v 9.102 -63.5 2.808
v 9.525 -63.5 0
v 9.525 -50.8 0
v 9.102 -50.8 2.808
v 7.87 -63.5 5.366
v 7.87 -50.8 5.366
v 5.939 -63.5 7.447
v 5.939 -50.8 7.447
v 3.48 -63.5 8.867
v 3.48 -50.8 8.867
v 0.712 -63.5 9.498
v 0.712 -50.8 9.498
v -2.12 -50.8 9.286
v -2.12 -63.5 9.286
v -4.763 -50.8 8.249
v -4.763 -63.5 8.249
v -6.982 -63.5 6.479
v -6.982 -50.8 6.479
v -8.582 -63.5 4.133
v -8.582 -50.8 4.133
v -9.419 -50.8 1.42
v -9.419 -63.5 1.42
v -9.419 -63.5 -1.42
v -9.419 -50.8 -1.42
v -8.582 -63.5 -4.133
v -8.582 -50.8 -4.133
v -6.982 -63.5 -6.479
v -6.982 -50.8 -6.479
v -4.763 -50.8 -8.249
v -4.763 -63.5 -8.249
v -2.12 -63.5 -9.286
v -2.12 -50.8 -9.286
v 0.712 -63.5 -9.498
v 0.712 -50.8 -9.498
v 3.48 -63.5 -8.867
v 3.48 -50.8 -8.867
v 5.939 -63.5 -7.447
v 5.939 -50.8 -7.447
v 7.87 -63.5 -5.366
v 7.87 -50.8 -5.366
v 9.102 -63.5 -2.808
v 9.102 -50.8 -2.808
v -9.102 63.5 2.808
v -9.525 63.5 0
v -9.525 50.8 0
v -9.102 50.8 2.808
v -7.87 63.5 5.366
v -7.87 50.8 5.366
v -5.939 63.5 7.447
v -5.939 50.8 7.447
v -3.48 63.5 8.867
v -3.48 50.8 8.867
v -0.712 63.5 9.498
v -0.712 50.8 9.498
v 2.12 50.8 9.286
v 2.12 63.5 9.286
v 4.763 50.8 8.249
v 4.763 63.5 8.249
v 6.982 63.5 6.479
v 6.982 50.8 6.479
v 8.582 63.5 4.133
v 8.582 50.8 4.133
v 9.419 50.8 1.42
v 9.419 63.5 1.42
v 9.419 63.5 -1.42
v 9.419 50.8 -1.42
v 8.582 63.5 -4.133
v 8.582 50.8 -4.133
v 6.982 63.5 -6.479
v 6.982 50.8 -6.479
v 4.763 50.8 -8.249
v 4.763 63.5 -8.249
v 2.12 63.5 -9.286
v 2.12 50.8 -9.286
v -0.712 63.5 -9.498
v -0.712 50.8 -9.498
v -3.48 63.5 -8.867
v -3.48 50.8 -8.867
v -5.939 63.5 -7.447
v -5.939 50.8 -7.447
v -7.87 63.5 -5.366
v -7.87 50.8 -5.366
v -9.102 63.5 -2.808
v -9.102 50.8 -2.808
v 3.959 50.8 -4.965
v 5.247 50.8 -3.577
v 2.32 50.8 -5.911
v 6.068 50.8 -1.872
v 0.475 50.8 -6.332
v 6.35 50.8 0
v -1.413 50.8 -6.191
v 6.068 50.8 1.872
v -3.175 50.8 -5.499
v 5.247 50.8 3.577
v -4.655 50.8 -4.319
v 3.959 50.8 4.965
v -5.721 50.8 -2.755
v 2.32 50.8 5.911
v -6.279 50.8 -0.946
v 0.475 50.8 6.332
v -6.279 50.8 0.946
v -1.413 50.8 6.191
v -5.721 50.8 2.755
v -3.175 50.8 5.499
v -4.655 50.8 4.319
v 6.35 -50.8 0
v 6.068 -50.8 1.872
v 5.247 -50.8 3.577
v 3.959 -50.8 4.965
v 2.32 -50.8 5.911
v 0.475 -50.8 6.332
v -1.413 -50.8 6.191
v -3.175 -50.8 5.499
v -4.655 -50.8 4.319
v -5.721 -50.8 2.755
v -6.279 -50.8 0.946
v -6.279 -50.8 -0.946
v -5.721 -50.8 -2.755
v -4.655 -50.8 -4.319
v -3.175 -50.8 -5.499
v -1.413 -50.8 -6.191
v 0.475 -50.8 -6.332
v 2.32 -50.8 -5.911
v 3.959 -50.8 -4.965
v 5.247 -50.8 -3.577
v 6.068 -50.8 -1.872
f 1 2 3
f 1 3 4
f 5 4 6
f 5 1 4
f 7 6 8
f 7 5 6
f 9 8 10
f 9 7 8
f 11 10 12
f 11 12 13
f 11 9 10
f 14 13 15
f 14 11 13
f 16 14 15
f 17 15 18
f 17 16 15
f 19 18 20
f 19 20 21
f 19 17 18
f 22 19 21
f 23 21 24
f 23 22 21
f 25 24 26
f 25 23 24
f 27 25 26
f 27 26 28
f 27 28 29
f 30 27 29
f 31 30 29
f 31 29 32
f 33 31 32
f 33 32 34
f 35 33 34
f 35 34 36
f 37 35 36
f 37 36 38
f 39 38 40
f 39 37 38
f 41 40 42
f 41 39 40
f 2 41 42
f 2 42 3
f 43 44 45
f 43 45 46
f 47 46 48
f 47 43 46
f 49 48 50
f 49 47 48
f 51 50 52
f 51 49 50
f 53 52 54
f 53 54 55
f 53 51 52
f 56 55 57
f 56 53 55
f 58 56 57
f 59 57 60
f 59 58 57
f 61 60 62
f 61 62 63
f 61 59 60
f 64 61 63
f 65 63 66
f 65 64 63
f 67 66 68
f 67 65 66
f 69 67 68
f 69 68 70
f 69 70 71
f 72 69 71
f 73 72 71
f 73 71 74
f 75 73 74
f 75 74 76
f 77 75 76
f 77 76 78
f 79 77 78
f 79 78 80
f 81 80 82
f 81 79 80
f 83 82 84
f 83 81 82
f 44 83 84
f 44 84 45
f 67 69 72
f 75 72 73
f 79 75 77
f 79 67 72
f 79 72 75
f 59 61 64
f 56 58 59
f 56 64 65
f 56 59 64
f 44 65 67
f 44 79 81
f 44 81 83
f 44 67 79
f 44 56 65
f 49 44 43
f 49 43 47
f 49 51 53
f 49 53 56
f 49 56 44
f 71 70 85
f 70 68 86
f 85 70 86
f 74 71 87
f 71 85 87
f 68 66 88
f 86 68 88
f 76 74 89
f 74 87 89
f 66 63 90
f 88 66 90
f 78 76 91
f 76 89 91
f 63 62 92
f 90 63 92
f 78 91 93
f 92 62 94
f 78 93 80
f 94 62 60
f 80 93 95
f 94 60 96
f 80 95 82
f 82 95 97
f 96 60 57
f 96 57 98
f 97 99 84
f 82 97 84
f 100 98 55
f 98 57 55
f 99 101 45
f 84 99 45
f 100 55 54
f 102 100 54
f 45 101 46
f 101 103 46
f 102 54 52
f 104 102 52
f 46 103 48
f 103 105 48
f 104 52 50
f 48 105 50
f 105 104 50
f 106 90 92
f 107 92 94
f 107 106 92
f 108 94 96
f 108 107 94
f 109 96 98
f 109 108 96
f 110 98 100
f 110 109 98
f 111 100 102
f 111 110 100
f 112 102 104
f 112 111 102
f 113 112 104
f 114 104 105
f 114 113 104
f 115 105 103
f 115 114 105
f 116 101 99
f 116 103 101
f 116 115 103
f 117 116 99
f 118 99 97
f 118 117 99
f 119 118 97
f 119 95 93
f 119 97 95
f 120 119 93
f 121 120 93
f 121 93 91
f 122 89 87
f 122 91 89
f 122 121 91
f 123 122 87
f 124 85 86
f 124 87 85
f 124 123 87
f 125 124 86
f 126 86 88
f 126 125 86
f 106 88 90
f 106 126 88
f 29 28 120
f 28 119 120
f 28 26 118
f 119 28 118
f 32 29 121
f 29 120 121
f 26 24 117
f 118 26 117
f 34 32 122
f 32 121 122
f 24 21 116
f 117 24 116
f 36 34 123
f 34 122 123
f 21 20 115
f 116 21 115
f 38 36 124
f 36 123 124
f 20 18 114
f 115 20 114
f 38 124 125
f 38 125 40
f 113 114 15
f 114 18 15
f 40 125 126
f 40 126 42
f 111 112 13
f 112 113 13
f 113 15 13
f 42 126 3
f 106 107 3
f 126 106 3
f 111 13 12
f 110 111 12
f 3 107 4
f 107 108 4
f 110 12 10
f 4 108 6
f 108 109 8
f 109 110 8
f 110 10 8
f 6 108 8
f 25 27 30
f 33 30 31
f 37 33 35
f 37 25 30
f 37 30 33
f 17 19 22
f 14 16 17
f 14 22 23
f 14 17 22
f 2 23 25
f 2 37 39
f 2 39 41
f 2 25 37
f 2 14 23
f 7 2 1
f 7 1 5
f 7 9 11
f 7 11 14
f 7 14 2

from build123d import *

# Parameters (mm, degrees)
F0_R     = 6.35
F1_DEPTH = 63.5
F3_R     = 9.525
F3_R_2   = 6.35
F4_DEPTH = 12.7
F2_R     = 9.525
F2_R_2   = 6.35
F5_DEPTH = 12.7


with BuildPart() as f1:
    # F0 (on Front) → F1 (new body, symmetric)
    with BuildSketch(Plane.XZ):
        Circle(F0_R)
    extrude(amount=F1_DEPTH, both=True)

    # F3 (on face) → F4 (join)
    with BuildSketch(Plane(origin=(0, 63.5, 0), x_dir=(-1, 0, 0), z_dir=(0, 1, 0))):
        Circle(F3_R)
        Circle(F3_R_2, mode=Mode.SUBTRACT)
    extrude(amount=-F4_DEPTH)

    # F2 (on face) → F5 (join)
    with BuildSketch(Plane.XZ.offset(63.5)):
        Circle(F2_R)
        Circle(F2_R_2, mode=Mode.SUBTRACT)
    extrude(amount=-F5_DEPTH)


solid = f1.part
